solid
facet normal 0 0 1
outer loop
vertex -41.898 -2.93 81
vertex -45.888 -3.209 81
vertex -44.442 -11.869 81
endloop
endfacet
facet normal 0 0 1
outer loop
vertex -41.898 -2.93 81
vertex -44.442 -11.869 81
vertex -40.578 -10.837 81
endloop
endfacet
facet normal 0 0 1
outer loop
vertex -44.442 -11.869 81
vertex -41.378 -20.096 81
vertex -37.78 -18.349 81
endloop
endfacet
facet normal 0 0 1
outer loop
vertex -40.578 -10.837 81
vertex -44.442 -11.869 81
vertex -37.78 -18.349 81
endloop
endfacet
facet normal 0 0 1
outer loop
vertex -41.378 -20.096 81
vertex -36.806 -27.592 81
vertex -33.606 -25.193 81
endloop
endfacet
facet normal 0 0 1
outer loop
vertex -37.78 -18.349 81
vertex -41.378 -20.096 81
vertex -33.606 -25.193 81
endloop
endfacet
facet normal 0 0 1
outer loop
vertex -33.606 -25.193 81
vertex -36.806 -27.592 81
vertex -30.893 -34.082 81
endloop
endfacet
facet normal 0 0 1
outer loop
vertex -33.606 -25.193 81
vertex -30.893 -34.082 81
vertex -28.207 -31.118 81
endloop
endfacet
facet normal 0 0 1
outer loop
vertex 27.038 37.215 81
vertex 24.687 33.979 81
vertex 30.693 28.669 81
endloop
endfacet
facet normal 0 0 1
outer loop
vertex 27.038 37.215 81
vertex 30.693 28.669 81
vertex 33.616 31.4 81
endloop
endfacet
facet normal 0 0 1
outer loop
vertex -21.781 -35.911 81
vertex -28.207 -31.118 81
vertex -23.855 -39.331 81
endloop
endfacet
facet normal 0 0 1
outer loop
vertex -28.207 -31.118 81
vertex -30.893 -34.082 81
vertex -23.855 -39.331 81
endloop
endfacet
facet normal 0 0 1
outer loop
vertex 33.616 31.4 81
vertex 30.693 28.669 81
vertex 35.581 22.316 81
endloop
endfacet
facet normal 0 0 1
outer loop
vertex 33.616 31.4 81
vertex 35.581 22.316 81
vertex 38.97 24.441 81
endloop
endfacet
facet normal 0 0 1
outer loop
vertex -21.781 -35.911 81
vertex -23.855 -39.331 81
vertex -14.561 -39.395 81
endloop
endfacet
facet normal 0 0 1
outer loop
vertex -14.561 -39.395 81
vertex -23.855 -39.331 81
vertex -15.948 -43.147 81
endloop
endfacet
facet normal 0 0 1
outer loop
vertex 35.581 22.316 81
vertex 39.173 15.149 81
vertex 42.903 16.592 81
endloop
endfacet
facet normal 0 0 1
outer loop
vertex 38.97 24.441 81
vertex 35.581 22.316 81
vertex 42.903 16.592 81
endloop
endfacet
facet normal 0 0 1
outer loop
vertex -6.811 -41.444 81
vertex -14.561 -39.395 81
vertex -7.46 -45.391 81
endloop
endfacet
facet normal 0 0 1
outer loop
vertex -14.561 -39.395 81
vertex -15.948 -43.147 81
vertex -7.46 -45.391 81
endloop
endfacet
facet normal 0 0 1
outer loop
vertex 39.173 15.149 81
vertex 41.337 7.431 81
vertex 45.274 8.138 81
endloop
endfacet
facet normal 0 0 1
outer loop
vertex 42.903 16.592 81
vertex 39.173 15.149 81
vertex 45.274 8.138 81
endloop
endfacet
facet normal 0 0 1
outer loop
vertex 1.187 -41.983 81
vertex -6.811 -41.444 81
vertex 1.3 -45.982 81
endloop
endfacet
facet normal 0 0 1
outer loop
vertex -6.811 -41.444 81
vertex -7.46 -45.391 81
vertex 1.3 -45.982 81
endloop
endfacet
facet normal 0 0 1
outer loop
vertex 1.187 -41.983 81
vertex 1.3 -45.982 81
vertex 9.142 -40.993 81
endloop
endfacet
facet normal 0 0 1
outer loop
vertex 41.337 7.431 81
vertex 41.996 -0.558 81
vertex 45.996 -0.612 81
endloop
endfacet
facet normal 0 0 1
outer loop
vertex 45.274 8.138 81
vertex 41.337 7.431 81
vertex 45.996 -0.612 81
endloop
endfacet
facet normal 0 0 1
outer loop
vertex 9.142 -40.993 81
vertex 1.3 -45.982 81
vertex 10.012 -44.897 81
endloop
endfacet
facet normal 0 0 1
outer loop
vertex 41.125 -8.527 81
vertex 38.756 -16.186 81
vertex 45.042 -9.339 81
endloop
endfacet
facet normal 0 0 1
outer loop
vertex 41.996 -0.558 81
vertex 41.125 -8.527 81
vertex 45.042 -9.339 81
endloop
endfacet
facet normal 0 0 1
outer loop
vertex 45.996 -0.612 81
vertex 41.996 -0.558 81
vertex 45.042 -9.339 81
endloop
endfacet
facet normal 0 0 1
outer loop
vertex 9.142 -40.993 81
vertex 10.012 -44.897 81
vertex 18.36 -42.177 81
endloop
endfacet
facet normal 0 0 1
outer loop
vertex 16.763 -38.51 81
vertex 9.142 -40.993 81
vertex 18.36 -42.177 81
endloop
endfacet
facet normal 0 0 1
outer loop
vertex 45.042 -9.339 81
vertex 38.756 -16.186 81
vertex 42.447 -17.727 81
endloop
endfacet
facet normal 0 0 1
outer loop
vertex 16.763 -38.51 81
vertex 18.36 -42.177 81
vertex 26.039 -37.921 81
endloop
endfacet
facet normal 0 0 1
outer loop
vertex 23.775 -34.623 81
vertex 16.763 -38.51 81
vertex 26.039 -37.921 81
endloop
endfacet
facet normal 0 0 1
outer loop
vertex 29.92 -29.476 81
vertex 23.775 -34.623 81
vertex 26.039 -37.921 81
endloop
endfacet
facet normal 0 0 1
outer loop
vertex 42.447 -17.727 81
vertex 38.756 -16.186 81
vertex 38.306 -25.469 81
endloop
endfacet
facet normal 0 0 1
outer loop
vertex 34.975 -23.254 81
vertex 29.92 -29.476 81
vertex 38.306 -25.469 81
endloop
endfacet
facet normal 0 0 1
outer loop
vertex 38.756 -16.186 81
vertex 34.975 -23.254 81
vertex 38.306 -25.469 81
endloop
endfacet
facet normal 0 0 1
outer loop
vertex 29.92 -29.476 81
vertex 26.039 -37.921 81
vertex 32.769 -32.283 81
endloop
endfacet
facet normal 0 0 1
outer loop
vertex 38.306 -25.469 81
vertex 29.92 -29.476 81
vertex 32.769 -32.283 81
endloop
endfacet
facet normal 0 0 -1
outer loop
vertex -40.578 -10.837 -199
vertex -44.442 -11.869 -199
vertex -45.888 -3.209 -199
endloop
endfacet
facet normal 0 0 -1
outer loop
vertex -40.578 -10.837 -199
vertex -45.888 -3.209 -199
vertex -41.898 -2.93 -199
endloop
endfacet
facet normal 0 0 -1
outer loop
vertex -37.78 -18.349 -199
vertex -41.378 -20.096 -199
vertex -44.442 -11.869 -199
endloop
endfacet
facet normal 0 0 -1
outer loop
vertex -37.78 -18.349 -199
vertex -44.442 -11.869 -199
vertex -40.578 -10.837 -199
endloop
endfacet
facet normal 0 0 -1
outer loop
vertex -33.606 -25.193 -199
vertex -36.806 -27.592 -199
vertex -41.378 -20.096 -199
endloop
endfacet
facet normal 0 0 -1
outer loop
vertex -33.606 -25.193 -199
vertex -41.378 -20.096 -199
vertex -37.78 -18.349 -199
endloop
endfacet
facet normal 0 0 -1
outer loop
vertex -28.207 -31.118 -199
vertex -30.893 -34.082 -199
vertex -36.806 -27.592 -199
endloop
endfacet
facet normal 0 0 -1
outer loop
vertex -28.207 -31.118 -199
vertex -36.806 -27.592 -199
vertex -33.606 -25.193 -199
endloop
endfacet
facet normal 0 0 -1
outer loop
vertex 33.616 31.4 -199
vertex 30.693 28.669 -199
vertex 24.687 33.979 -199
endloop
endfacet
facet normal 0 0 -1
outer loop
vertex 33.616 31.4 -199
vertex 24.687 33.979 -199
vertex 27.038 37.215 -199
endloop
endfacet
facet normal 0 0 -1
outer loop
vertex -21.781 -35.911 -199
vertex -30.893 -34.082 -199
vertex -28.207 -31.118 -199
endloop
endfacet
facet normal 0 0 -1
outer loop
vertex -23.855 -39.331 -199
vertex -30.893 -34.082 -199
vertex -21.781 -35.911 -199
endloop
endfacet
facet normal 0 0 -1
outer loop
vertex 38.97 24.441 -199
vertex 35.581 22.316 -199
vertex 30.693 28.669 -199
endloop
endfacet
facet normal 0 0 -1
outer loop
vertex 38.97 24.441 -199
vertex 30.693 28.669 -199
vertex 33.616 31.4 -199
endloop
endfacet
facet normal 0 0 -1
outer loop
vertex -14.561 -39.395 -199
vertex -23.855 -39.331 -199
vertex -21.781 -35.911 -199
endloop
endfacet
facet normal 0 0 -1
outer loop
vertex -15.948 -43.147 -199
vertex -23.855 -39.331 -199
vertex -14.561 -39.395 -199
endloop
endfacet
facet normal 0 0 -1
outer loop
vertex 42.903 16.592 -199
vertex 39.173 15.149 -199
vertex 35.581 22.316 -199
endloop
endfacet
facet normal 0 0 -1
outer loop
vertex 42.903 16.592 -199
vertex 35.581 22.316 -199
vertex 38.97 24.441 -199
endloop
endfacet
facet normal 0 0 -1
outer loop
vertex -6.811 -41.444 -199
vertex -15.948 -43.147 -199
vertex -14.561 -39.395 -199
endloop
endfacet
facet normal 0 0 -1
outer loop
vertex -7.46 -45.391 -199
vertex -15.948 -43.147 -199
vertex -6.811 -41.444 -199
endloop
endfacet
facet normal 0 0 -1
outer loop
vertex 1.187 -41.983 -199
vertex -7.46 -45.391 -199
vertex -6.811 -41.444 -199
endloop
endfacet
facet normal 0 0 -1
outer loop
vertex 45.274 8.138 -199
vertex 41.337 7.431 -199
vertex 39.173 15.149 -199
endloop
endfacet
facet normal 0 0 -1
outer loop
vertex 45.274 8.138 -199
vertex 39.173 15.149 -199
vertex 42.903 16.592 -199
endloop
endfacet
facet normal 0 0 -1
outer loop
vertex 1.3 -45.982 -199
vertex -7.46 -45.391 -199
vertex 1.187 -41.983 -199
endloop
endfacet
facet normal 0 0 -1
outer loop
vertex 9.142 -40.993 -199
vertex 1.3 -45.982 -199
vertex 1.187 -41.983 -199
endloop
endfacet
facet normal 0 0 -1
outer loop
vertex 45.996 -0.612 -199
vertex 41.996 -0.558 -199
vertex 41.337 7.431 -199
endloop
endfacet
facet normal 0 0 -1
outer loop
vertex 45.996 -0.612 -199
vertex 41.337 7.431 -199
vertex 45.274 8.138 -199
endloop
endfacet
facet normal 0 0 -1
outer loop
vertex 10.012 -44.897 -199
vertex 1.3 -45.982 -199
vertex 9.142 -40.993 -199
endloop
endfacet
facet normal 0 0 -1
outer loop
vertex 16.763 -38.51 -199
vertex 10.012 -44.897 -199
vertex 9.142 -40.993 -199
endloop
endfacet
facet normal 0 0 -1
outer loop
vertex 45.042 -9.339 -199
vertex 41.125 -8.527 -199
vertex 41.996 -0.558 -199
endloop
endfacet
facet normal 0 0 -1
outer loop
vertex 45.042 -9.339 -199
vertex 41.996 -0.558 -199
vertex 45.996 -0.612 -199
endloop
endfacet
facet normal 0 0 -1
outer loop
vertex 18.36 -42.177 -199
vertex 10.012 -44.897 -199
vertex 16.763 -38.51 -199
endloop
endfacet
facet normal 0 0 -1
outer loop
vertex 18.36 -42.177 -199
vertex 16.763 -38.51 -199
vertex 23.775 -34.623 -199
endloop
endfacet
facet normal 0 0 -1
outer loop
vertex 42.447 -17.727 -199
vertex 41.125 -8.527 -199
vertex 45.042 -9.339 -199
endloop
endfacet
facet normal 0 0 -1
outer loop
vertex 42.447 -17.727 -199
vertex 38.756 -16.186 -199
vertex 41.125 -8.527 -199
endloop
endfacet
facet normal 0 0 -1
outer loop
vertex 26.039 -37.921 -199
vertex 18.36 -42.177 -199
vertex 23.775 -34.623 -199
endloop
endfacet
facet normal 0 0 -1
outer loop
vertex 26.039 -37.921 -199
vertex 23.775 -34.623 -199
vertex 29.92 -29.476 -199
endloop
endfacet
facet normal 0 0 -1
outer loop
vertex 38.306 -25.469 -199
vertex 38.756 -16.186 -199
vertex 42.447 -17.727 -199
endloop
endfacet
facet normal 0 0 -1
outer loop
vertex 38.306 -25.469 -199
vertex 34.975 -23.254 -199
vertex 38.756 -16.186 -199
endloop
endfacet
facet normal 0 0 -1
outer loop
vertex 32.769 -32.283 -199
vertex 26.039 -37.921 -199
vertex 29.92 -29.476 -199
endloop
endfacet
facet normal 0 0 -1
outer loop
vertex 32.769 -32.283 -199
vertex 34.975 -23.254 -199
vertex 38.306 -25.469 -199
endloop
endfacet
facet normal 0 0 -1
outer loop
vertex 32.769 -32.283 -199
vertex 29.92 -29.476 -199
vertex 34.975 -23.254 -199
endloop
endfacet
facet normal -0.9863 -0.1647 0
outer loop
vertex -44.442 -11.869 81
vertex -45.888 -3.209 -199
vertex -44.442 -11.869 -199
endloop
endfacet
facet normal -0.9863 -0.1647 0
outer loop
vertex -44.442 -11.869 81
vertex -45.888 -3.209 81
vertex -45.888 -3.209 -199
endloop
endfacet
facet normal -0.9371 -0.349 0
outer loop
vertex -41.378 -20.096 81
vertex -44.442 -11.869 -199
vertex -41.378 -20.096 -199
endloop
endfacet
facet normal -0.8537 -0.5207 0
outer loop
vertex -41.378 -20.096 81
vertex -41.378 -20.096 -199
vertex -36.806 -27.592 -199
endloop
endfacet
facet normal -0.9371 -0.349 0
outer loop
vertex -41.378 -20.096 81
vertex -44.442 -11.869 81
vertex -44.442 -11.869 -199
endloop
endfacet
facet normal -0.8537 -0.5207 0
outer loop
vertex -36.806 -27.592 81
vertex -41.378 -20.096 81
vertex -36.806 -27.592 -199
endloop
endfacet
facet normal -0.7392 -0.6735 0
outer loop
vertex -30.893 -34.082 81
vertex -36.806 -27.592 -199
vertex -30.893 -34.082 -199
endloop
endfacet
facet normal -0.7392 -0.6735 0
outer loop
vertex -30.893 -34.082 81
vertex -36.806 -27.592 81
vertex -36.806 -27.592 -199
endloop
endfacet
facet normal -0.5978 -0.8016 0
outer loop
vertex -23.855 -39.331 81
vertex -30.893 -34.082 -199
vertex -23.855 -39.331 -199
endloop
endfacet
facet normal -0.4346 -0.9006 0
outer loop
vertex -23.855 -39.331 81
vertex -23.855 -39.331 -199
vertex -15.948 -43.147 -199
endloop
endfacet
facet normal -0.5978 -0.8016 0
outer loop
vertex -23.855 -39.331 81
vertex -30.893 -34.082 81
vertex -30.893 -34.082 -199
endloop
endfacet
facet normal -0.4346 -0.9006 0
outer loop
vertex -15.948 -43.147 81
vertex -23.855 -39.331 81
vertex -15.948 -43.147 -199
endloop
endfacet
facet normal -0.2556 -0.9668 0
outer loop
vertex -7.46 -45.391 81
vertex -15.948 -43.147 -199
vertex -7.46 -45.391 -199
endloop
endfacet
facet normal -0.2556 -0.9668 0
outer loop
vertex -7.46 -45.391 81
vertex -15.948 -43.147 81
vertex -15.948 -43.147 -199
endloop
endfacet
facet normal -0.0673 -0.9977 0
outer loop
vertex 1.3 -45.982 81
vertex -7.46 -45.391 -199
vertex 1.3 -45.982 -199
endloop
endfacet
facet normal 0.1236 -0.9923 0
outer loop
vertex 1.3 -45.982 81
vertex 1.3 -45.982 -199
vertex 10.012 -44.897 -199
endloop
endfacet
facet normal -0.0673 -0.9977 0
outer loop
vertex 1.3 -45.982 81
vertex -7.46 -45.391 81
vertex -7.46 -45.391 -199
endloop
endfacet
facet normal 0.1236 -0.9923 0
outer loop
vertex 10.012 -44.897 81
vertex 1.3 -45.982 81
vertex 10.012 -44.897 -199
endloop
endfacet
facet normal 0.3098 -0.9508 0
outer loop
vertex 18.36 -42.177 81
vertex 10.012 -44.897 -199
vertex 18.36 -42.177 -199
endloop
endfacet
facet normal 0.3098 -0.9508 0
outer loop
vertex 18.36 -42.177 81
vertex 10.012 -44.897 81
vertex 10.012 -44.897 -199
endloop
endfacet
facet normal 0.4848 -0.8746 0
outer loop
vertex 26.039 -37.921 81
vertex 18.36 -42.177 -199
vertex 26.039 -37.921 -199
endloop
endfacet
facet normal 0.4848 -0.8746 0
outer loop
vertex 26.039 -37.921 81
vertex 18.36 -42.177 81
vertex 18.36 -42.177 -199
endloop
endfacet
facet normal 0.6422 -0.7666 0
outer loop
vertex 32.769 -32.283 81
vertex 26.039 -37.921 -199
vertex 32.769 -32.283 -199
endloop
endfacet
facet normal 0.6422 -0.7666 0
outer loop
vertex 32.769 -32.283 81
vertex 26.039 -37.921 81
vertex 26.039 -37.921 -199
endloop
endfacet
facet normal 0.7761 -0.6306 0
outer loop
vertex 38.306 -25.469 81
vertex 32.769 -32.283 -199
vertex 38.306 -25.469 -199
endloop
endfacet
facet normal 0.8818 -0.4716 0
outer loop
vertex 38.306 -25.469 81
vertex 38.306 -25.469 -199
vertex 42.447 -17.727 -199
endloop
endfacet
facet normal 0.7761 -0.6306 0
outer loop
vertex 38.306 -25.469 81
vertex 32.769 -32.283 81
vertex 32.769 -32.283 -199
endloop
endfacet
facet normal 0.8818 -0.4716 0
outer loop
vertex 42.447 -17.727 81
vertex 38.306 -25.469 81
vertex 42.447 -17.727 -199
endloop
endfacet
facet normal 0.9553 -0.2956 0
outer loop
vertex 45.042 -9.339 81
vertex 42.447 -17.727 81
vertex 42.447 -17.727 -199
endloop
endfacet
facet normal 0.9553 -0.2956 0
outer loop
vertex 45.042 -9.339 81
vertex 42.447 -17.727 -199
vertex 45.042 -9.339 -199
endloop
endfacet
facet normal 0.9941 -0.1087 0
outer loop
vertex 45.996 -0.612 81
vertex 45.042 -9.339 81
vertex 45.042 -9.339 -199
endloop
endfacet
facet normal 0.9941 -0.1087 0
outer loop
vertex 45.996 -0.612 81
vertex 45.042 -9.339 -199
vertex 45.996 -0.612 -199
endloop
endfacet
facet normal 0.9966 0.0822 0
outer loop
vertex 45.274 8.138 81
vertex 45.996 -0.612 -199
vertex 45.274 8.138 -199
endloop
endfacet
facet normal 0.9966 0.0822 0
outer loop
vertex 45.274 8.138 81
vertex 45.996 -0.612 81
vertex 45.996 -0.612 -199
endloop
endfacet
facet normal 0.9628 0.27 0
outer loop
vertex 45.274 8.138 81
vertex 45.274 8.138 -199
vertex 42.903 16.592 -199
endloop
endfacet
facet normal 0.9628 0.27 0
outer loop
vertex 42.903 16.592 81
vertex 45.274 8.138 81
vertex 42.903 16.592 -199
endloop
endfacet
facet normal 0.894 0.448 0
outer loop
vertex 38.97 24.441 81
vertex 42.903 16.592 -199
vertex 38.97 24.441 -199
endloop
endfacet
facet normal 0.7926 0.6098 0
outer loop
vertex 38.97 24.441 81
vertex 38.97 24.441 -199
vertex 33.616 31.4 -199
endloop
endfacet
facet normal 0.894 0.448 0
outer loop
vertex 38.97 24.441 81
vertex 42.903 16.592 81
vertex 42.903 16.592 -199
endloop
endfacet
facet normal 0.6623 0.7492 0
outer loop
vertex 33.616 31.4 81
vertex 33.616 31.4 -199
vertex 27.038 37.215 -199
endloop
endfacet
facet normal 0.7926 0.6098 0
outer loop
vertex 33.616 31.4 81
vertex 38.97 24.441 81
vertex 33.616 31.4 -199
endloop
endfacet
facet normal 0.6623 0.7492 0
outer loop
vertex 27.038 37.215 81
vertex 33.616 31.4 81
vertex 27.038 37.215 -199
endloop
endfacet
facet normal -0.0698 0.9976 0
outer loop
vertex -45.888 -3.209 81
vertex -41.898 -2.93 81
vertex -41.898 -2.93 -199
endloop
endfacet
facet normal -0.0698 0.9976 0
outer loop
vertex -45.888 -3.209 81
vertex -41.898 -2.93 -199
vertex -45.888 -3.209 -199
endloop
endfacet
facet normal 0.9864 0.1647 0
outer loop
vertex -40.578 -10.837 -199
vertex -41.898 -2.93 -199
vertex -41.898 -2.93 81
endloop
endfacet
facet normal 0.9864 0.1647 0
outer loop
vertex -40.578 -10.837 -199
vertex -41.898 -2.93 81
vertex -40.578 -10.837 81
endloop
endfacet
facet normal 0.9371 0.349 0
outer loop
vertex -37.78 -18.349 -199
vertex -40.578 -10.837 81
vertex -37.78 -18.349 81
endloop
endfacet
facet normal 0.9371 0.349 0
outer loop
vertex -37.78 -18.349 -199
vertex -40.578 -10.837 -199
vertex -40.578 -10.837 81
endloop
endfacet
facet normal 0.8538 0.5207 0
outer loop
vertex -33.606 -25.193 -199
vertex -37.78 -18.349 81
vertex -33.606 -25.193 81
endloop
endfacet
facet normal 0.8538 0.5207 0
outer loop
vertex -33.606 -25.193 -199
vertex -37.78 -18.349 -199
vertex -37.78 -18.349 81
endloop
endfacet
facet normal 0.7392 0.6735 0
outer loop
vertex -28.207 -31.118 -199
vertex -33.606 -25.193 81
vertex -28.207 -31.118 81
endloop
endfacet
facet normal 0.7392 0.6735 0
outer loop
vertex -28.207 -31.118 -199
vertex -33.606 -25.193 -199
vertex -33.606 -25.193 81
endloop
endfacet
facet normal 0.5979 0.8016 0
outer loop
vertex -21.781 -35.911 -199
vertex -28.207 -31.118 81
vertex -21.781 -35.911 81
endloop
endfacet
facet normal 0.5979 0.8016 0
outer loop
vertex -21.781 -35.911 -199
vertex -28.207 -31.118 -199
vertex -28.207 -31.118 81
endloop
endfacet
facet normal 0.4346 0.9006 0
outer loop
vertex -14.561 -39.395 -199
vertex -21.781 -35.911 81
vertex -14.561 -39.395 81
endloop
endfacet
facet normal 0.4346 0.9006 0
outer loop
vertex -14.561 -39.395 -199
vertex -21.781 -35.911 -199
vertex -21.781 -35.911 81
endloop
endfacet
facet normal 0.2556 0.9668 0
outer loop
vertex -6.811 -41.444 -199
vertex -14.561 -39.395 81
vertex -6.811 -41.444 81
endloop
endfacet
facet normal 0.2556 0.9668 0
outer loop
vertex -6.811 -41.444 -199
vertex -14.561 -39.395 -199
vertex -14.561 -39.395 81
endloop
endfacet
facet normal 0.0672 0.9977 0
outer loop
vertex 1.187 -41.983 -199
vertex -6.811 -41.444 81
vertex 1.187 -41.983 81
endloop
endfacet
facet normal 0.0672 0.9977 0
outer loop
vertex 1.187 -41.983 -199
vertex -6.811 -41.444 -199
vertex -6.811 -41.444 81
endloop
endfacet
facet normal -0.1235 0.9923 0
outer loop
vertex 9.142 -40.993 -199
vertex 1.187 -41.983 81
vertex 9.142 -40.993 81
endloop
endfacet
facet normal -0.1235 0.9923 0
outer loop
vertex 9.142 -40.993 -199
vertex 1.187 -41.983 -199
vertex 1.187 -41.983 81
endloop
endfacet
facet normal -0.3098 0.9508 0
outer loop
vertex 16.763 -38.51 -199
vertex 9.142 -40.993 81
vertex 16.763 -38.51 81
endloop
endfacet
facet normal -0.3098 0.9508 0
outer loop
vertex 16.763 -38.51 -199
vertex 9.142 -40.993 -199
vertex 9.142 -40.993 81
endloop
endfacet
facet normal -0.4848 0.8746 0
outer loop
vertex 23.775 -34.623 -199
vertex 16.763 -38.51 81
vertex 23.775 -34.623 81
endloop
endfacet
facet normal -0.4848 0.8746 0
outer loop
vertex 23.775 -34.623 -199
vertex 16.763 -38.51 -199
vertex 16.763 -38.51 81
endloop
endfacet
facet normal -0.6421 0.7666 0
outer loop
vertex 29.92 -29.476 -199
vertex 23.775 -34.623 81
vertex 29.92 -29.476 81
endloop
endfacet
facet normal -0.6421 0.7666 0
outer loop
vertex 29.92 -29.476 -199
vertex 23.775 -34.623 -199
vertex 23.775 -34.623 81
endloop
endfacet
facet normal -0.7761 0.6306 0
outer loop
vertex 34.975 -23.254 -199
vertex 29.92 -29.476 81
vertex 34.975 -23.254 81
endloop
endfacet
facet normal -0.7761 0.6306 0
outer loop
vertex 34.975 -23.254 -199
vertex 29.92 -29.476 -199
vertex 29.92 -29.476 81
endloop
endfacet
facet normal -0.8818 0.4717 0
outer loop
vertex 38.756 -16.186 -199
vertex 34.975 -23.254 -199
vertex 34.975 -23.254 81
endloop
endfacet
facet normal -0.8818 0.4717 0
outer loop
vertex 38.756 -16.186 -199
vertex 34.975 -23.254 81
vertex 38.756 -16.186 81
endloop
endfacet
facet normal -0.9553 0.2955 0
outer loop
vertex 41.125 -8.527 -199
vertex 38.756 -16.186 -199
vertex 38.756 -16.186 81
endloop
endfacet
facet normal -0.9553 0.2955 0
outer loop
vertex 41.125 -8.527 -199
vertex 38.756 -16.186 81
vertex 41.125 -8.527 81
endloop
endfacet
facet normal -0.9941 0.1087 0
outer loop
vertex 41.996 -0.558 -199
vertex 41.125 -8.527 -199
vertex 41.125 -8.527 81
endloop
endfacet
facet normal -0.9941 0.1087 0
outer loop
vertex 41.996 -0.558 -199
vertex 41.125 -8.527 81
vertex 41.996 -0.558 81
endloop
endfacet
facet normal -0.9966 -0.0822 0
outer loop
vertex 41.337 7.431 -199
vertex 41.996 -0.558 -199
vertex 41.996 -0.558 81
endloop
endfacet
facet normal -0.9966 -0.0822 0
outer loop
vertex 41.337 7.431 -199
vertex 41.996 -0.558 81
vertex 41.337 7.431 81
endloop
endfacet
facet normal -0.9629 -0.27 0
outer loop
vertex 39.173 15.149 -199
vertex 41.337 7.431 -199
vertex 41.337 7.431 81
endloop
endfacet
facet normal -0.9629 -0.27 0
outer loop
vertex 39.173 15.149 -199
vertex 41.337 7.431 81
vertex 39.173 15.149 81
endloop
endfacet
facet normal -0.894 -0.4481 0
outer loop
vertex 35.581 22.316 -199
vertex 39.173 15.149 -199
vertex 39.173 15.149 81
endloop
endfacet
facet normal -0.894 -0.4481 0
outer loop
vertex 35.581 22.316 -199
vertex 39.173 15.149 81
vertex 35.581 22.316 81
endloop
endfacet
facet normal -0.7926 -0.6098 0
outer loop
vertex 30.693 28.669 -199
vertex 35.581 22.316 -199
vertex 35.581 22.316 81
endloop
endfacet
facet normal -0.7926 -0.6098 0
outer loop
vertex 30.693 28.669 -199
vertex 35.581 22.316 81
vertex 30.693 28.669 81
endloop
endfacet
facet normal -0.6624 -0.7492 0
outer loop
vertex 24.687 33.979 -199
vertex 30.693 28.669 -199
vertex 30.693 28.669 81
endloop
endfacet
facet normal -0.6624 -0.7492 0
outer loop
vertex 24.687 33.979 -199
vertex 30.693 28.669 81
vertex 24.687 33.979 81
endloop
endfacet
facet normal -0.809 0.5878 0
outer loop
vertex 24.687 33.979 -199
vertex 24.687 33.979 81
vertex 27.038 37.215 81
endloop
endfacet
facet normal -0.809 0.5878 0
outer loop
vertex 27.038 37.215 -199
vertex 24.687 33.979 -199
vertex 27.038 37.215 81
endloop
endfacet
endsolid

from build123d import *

# Parameters (mm, degrees)
CYLINDER072_R               = 42
CYLINDER072_DEPTH           = 297
CYLINDER073_W               = 46
CYLINDER073_H               = 280
CYLINDER073_ANGLE           = 230
CYLINDER073_PLACEMENT_ANGLE = 184


with BuildPart() as cylindre068:
    # Cylinder072 → Cylinder072 (new body)
    with BuildSketch(Plane.XY.offset(-207)):
        Circle(CYLINDER072_R)
    extrude(amount=CYLINDER072_DEPTH)


with BuildPart() as antenne_d_mission:
    # Cylinder073 → Cylinder073 (revolve)
    with BuildSketch(Plane.XZ):
        with Locations((23, 140)):
            Rectangle(CYLINDER073_W, CYLINDER073_H)
    revolve(axis=Axis((0, 0, 0), (0, 0, 1)), revolution_arc=CYLINDER073_ANGLE)


with BuildPart() as antenne_d_mission_1:
    # Cylinder073 placement: moved
    add(antenne_d_mission.part.moved(Location((0, 0, -207))).rotate(Axis((0, 0, -207), (0, 0, 1)), CYLINDER073_PLACEMENT_ANGLE))

    # Cut041: cut Cylindre068
    add(cylindre068.part, mode=Mode.SUBTRACT)


with BuildPart() as antenne_d_mission_2:
    # Cut041 placement: moved
    add(antenne_d_mission_1.part.moved(Location((0, 0, 8))))


solid = antenne_d_mission_2.part
